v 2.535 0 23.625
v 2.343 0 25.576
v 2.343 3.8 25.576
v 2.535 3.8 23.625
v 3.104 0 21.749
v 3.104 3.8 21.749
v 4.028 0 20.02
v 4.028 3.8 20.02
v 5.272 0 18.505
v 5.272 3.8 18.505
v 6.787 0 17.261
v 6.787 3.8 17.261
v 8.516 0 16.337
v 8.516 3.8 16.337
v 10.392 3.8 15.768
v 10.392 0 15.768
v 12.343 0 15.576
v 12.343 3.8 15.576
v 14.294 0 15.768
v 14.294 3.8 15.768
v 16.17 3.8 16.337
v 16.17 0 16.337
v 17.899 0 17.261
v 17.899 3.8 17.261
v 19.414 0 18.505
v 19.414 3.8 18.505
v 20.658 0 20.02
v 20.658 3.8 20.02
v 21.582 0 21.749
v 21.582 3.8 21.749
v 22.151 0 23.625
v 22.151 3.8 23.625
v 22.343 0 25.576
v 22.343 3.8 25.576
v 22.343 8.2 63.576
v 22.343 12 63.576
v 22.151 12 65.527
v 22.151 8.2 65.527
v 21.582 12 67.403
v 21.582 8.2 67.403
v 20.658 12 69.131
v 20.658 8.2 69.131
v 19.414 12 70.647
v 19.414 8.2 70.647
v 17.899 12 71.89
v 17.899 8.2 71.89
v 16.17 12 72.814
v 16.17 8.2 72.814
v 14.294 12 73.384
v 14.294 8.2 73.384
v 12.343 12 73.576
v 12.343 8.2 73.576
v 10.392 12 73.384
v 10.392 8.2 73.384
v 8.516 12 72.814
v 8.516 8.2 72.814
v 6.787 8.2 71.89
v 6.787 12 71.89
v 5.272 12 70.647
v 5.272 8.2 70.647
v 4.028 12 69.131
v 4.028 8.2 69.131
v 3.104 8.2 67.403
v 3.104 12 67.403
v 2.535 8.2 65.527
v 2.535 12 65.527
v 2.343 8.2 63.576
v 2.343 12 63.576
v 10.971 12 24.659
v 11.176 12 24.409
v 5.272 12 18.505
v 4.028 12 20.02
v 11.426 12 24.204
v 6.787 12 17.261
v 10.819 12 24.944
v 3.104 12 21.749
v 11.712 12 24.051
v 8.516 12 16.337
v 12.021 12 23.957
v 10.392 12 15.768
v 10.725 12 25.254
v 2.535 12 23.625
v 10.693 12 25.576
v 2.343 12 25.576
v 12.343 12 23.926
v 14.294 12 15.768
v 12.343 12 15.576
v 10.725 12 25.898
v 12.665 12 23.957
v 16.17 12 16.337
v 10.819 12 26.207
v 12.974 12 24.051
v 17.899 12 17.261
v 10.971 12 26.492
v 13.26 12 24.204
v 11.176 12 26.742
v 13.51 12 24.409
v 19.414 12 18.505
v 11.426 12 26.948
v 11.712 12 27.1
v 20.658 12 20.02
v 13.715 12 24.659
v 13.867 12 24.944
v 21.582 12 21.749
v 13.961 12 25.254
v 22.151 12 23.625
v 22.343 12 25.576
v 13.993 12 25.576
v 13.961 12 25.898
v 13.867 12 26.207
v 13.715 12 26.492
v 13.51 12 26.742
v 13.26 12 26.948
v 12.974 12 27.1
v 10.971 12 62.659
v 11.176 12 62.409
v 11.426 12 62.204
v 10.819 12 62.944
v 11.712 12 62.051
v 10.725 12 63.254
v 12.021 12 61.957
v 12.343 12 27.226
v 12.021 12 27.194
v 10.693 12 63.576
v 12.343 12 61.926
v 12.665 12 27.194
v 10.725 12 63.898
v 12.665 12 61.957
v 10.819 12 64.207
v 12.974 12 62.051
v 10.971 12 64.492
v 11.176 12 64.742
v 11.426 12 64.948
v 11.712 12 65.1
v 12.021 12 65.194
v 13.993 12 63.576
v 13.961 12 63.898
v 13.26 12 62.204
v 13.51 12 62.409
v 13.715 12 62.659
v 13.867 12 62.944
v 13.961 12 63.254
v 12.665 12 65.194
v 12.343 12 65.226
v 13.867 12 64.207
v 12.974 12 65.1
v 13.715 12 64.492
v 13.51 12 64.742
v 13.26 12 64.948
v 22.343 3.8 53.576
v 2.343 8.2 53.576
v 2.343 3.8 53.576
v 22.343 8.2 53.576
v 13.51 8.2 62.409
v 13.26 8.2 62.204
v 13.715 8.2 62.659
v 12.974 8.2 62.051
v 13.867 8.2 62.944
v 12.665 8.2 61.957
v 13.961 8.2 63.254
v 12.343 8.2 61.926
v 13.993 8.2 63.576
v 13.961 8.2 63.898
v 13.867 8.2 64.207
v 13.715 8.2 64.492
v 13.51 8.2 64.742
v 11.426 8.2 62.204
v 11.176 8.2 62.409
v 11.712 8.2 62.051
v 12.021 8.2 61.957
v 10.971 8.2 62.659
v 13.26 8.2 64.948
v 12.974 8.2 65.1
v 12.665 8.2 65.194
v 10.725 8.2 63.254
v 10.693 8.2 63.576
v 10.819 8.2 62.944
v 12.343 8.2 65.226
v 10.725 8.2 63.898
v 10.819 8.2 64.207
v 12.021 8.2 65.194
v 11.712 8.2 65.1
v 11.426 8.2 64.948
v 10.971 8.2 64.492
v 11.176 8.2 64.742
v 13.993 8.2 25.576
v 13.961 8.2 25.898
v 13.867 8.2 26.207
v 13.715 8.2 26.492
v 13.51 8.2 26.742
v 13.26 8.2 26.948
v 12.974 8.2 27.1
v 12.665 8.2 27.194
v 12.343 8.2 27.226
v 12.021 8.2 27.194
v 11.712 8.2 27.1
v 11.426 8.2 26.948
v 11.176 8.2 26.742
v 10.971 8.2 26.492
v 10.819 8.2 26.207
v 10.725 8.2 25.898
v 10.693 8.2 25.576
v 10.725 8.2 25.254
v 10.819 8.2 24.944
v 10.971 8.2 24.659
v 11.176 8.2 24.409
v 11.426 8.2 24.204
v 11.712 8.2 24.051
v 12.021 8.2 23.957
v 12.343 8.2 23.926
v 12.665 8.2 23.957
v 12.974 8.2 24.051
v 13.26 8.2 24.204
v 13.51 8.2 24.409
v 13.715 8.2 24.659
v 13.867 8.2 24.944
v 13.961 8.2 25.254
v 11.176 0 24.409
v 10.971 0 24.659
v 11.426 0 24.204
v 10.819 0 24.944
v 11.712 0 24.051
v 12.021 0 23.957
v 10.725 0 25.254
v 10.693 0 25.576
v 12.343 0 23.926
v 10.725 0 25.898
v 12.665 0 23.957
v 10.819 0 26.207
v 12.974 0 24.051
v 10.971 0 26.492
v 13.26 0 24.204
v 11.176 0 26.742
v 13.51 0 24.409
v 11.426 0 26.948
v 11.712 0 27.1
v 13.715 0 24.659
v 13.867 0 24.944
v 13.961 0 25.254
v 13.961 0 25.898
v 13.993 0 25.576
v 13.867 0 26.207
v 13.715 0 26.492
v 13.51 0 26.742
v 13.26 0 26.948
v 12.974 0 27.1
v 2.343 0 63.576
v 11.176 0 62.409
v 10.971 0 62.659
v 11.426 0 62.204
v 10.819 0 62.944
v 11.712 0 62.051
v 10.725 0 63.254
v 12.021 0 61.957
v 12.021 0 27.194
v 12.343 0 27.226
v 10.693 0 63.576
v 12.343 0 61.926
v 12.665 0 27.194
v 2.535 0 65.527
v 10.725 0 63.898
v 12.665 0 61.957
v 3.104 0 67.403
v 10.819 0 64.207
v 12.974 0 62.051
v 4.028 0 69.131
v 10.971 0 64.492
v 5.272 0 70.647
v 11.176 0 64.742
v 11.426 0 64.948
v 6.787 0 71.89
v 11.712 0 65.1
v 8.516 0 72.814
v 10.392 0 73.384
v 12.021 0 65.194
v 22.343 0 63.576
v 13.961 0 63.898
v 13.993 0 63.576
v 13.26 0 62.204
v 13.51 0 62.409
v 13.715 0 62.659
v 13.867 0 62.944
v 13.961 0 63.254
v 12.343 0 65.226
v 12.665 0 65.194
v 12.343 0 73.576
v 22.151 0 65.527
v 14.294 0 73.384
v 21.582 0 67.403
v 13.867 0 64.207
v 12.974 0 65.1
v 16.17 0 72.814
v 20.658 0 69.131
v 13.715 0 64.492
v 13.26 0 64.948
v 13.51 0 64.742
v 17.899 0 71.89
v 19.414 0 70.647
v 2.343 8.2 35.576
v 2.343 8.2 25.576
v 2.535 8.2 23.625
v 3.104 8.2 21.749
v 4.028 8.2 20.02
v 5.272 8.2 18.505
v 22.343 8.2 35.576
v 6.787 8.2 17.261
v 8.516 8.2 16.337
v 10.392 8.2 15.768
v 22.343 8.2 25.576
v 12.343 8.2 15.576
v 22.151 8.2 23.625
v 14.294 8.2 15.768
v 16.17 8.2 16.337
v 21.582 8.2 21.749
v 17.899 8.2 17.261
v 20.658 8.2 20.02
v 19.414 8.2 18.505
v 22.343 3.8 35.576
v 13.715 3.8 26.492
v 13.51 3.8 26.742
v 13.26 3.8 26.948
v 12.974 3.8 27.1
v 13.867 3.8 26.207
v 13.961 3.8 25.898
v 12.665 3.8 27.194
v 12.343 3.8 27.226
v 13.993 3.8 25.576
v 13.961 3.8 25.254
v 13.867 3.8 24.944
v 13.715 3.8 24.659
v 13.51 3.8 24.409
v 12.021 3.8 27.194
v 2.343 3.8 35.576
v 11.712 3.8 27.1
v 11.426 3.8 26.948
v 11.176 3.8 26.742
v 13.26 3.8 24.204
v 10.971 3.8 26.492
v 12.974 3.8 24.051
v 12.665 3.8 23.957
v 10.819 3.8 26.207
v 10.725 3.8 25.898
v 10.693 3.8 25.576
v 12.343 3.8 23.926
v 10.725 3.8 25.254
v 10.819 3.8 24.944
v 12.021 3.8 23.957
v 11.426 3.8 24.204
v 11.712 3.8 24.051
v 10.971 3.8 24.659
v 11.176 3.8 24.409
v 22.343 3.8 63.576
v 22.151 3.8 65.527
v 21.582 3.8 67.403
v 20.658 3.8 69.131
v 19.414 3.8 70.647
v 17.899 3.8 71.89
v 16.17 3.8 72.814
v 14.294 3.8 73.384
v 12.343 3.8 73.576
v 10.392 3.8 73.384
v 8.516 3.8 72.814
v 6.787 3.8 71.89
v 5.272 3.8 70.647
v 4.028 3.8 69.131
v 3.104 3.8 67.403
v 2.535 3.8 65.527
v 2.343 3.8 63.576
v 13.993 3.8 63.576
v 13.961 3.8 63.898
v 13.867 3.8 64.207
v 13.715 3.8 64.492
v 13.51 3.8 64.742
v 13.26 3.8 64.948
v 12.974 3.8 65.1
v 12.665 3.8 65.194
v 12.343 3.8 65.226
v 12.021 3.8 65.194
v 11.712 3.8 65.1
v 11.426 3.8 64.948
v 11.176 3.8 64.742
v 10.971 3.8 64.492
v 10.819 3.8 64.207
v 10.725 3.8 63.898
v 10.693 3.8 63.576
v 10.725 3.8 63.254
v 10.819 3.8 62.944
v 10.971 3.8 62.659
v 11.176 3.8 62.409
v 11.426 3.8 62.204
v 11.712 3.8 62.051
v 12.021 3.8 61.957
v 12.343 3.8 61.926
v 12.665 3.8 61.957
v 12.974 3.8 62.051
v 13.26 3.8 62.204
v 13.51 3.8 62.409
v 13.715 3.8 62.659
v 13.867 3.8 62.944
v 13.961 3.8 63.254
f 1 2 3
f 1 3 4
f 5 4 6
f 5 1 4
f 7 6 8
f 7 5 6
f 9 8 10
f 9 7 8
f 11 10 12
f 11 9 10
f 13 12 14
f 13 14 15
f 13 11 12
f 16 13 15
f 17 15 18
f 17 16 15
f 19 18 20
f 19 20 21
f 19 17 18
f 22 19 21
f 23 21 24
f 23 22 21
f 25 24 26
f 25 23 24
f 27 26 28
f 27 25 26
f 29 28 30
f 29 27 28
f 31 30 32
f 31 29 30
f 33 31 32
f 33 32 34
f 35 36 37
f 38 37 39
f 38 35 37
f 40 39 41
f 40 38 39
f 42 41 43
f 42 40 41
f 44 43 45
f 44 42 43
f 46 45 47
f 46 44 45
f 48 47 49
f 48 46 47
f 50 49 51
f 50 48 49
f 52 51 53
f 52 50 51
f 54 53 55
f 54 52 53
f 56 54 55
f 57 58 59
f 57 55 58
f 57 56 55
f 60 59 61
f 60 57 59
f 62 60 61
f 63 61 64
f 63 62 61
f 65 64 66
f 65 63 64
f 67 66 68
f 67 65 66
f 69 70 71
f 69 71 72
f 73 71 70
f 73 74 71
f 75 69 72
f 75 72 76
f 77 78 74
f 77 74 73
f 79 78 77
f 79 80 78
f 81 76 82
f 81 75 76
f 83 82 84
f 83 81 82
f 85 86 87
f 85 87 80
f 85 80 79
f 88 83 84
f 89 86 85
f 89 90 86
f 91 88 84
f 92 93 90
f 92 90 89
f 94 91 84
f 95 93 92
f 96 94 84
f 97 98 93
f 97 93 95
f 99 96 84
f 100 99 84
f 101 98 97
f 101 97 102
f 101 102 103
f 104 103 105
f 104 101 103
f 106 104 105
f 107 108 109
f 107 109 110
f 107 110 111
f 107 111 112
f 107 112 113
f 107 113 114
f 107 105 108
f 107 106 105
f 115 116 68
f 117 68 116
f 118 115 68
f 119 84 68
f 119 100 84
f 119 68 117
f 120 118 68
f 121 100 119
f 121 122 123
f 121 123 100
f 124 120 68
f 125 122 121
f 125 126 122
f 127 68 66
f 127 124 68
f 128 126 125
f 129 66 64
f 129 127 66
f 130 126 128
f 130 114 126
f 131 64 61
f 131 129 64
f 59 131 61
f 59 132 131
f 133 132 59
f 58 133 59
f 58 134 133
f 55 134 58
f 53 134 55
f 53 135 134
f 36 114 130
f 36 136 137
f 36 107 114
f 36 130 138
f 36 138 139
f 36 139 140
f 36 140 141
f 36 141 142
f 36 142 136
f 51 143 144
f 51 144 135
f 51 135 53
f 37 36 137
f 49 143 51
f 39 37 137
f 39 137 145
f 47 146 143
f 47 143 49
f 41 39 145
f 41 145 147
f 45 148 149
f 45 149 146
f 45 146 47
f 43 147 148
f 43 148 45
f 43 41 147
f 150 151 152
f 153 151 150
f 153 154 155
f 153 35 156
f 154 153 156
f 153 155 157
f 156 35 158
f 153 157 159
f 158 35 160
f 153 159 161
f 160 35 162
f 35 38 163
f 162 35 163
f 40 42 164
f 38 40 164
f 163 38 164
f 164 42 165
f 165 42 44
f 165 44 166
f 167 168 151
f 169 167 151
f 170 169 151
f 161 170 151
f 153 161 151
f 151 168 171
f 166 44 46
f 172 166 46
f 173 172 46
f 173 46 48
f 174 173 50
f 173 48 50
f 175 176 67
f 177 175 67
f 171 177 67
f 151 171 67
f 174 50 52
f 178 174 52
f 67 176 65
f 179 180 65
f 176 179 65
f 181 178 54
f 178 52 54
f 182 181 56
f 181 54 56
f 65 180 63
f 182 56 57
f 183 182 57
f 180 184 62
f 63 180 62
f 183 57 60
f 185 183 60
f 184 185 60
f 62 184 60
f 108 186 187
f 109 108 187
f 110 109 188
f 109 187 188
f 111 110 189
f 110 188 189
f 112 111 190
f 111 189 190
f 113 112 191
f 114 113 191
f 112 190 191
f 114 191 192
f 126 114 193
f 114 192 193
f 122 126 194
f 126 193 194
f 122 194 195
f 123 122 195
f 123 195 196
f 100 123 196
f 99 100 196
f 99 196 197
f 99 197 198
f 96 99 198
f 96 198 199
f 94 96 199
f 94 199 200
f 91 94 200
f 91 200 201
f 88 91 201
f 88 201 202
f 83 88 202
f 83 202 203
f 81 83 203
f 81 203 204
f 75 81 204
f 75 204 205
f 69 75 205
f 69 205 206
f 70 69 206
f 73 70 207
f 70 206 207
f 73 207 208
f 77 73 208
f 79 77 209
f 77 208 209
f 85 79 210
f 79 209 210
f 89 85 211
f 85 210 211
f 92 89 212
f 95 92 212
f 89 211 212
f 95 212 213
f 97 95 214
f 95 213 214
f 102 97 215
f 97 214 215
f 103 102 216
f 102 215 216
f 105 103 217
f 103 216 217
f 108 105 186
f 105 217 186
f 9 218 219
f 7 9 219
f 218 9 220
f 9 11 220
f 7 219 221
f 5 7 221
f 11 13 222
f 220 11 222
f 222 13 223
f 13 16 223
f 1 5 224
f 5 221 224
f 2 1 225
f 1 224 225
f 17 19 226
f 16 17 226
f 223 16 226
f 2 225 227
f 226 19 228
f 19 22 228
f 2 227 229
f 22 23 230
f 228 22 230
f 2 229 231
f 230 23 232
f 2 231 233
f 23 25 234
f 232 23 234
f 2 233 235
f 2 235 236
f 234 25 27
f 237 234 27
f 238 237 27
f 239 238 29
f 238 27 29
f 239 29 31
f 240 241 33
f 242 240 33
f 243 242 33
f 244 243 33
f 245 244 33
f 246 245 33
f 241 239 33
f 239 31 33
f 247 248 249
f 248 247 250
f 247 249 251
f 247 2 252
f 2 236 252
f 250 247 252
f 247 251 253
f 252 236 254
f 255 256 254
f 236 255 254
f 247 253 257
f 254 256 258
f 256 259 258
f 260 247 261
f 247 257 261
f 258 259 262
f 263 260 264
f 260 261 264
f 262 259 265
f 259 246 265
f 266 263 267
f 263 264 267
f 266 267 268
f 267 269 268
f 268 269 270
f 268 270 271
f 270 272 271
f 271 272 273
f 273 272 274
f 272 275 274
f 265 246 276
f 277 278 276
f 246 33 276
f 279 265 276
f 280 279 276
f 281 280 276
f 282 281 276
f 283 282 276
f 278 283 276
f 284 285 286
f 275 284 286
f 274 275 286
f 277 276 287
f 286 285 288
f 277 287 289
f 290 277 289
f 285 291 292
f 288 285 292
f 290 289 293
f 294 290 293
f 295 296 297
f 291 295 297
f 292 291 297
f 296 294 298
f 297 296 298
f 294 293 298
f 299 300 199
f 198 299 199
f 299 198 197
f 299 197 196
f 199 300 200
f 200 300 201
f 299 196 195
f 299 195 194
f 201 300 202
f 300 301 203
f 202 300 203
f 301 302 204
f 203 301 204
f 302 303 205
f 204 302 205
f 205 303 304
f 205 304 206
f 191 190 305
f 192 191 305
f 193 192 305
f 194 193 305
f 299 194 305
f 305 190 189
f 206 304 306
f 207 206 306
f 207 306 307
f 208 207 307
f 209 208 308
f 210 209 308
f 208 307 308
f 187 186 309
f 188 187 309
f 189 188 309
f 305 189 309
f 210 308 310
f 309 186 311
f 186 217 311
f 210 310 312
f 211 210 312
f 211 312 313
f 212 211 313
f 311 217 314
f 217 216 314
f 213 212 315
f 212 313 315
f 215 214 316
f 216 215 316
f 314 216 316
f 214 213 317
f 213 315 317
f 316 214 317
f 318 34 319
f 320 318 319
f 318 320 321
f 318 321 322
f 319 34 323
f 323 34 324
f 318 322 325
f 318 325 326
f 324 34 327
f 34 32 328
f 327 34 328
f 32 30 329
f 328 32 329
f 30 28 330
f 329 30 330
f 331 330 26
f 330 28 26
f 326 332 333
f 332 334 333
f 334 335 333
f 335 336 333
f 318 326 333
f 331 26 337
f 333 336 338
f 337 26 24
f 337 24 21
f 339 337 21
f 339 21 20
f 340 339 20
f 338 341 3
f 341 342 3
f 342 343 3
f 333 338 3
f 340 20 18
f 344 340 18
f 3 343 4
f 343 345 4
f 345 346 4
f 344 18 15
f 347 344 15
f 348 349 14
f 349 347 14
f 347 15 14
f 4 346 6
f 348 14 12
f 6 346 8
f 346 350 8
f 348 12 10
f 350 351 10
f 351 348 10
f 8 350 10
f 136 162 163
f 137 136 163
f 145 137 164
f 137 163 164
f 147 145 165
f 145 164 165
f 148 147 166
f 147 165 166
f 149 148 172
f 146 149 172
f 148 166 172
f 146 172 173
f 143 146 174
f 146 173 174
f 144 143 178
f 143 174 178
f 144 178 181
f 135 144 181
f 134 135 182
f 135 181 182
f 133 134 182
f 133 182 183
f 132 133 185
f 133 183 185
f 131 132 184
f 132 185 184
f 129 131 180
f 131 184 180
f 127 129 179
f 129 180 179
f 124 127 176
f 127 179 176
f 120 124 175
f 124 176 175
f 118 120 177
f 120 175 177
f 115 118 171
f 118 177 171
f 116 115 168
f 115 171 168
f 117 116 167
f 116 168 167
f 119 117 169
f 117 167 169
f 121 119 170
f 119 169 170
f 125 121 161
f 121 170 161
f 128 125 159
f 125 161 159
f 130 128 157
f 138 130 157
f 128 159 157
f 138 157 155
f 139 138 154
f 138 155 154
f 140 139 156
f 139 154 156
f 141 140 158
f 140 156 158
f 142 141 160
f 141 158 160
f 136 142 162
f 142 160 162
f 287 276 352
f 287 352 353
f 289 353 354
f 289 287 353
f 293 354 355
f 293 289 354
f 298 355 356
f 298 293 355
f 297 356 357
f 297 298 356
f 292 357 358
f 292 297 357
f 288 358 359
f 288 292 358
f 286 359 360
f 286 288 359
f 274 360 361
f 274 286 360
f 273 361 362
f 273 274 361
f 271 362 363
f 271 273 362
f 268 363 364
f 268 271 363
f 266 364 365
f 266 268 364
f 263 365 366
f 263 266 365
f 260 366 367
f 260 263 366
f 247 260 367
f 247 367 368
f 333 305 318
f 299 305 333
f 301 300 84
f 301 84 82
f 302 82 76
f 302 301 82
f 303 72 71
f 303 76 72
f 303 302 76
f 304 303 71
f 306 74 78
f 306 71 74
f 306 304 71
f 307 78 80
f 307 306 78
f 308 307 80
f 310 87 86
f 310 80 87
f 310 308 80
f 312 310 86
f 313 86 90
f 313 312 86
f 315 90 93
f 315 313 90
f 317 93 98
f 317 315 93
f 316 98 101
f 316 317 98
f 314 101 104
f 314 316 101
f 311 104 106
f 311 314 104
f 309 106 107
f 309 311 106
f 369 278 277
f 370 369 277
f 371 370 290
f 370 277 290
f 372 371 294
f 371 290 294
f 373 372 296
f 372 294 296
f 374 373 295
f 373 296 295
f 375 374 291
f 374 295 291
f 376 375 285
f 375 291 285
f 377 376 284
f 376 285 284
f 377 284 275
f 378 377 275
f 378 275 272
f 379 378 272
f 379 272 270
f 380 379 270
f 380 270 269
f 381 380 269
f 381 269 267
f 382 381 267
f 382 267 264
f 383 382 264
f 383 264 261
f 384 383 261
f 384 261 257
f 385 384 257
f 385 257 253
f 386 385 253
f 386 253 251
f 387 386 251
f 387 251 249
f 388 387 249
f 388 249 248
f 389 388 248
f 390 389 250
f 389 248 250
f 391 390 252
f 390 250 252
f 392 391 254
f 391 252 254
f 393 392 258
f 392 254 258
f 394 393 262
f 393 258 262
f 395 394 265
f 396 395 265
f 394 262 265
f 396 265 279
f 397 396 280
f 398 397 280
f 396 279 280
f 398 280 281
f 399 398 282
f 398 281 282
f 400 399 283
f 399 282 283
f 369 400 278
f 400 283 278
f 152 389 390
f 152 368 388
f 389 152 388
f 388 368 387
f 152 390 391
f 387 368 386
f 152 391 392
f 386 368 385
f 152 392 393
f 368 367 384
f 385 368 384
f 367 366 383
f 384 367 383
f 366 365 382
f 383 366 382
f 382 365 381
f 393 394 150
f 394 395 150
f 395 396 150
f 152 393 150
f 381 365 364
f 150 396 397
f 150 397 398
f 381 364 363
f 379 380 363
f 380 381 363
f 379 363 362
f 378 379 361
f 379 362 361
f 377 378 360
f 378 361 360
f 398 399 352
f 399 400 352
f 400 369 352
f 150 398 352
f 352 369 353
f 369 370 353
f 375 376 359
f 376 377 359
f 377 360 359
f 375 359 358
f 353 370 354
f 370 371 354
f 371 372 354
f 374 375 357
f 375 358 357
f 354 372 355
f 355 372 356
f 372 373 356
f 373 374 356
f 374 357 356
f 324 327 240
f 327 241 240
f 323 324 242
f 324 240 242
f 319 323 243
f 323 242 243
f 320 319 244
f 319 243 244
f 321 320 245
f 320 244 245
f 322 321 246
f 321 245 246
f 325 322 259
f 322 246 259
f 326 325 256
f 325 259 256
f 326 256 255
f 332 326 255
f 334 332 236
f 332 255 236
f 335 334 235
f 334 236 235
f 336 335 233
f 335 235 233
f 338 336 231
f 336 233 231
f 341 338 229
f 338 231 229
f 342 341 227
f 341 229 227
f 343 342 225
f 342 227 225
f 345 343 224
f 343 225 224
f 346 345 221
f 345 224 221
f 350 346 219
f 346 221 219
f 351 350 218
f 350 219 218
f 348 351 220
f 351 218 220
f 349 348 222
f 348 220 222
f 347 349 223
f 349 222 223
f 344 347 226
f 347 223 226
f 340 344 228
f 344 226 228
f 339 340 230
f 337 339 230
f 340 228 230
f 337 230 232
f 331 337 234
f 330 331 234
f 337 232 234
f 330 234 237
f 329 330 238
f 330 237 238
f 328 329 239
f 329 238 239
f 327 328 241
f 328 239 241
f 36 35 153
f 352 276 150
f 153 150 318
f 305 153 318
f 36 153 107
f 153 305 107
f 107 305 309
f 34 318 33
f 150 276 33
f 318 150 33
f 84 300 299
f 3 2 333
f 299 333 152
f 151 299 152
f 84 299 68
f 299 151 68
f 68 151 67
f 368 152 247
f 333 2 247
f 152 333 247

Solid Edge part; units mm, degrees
sketch "Sketch1" plane through (0, 0, 0) normal (0, -1, 0) x (1, 0, 0)
  circle A0 centre (12.343, 25.5757) radius 1.65
  arc A1 (2.343, 63.5757) -> (22.343, 63.5757) centre (12.343, 63.5757) cw
  line L0 (22.343, 63.5757) -> (22.343, 25.5757)
  arc A2 (22.343, 25.5757) -> (2.343, 25.5757) centre (12.343, 25.5757) cw
  line L1 (2.343, 25.5757) -> (2.343, 63.5757)
  circle A3 centre (12.343, 63.5757) radius 1.65
  dimension "D1" = 38
extrude "Protrusion1" add sketch "Sketch1" against normal blind 12
sketch "Sketch2" plane through (12.343, 6, 73.5757) normal (0, 0, 1) x (0, -1, 0)
  line L0 (2.2, -10.2) -> (2.2, 10.2)
  line L1 (2.2, 10.2) -> (-2.2, 10.2)
  line L2 (-2.2, 10.2) -> (-2.2, -10.2)
  line L3 (-2.2, -10.2) -> (2.2, -10.2)
extrude "ExtrudedCutout_1" cut sketch "Sketch2" against normal blind 20
sketch "Sketch3" plane through (12.343, 6, 15.5757) normal (0, 0, -1) x (0, -1, 0)
  line L0 (2.2, 10.2) -> (-2.2, 10.2)
  line L1 (-2.2, 10.2) -> (-2.2, -10.2)
  line L2 (-2.2, -10.2) -> (2.2, -10.2)
  line L3 (2.2, -10.2) -> (2.2, 10.2)
extrude "ExtrudedCutout_7" cut sketch "Sketch3" against normal blind 20
